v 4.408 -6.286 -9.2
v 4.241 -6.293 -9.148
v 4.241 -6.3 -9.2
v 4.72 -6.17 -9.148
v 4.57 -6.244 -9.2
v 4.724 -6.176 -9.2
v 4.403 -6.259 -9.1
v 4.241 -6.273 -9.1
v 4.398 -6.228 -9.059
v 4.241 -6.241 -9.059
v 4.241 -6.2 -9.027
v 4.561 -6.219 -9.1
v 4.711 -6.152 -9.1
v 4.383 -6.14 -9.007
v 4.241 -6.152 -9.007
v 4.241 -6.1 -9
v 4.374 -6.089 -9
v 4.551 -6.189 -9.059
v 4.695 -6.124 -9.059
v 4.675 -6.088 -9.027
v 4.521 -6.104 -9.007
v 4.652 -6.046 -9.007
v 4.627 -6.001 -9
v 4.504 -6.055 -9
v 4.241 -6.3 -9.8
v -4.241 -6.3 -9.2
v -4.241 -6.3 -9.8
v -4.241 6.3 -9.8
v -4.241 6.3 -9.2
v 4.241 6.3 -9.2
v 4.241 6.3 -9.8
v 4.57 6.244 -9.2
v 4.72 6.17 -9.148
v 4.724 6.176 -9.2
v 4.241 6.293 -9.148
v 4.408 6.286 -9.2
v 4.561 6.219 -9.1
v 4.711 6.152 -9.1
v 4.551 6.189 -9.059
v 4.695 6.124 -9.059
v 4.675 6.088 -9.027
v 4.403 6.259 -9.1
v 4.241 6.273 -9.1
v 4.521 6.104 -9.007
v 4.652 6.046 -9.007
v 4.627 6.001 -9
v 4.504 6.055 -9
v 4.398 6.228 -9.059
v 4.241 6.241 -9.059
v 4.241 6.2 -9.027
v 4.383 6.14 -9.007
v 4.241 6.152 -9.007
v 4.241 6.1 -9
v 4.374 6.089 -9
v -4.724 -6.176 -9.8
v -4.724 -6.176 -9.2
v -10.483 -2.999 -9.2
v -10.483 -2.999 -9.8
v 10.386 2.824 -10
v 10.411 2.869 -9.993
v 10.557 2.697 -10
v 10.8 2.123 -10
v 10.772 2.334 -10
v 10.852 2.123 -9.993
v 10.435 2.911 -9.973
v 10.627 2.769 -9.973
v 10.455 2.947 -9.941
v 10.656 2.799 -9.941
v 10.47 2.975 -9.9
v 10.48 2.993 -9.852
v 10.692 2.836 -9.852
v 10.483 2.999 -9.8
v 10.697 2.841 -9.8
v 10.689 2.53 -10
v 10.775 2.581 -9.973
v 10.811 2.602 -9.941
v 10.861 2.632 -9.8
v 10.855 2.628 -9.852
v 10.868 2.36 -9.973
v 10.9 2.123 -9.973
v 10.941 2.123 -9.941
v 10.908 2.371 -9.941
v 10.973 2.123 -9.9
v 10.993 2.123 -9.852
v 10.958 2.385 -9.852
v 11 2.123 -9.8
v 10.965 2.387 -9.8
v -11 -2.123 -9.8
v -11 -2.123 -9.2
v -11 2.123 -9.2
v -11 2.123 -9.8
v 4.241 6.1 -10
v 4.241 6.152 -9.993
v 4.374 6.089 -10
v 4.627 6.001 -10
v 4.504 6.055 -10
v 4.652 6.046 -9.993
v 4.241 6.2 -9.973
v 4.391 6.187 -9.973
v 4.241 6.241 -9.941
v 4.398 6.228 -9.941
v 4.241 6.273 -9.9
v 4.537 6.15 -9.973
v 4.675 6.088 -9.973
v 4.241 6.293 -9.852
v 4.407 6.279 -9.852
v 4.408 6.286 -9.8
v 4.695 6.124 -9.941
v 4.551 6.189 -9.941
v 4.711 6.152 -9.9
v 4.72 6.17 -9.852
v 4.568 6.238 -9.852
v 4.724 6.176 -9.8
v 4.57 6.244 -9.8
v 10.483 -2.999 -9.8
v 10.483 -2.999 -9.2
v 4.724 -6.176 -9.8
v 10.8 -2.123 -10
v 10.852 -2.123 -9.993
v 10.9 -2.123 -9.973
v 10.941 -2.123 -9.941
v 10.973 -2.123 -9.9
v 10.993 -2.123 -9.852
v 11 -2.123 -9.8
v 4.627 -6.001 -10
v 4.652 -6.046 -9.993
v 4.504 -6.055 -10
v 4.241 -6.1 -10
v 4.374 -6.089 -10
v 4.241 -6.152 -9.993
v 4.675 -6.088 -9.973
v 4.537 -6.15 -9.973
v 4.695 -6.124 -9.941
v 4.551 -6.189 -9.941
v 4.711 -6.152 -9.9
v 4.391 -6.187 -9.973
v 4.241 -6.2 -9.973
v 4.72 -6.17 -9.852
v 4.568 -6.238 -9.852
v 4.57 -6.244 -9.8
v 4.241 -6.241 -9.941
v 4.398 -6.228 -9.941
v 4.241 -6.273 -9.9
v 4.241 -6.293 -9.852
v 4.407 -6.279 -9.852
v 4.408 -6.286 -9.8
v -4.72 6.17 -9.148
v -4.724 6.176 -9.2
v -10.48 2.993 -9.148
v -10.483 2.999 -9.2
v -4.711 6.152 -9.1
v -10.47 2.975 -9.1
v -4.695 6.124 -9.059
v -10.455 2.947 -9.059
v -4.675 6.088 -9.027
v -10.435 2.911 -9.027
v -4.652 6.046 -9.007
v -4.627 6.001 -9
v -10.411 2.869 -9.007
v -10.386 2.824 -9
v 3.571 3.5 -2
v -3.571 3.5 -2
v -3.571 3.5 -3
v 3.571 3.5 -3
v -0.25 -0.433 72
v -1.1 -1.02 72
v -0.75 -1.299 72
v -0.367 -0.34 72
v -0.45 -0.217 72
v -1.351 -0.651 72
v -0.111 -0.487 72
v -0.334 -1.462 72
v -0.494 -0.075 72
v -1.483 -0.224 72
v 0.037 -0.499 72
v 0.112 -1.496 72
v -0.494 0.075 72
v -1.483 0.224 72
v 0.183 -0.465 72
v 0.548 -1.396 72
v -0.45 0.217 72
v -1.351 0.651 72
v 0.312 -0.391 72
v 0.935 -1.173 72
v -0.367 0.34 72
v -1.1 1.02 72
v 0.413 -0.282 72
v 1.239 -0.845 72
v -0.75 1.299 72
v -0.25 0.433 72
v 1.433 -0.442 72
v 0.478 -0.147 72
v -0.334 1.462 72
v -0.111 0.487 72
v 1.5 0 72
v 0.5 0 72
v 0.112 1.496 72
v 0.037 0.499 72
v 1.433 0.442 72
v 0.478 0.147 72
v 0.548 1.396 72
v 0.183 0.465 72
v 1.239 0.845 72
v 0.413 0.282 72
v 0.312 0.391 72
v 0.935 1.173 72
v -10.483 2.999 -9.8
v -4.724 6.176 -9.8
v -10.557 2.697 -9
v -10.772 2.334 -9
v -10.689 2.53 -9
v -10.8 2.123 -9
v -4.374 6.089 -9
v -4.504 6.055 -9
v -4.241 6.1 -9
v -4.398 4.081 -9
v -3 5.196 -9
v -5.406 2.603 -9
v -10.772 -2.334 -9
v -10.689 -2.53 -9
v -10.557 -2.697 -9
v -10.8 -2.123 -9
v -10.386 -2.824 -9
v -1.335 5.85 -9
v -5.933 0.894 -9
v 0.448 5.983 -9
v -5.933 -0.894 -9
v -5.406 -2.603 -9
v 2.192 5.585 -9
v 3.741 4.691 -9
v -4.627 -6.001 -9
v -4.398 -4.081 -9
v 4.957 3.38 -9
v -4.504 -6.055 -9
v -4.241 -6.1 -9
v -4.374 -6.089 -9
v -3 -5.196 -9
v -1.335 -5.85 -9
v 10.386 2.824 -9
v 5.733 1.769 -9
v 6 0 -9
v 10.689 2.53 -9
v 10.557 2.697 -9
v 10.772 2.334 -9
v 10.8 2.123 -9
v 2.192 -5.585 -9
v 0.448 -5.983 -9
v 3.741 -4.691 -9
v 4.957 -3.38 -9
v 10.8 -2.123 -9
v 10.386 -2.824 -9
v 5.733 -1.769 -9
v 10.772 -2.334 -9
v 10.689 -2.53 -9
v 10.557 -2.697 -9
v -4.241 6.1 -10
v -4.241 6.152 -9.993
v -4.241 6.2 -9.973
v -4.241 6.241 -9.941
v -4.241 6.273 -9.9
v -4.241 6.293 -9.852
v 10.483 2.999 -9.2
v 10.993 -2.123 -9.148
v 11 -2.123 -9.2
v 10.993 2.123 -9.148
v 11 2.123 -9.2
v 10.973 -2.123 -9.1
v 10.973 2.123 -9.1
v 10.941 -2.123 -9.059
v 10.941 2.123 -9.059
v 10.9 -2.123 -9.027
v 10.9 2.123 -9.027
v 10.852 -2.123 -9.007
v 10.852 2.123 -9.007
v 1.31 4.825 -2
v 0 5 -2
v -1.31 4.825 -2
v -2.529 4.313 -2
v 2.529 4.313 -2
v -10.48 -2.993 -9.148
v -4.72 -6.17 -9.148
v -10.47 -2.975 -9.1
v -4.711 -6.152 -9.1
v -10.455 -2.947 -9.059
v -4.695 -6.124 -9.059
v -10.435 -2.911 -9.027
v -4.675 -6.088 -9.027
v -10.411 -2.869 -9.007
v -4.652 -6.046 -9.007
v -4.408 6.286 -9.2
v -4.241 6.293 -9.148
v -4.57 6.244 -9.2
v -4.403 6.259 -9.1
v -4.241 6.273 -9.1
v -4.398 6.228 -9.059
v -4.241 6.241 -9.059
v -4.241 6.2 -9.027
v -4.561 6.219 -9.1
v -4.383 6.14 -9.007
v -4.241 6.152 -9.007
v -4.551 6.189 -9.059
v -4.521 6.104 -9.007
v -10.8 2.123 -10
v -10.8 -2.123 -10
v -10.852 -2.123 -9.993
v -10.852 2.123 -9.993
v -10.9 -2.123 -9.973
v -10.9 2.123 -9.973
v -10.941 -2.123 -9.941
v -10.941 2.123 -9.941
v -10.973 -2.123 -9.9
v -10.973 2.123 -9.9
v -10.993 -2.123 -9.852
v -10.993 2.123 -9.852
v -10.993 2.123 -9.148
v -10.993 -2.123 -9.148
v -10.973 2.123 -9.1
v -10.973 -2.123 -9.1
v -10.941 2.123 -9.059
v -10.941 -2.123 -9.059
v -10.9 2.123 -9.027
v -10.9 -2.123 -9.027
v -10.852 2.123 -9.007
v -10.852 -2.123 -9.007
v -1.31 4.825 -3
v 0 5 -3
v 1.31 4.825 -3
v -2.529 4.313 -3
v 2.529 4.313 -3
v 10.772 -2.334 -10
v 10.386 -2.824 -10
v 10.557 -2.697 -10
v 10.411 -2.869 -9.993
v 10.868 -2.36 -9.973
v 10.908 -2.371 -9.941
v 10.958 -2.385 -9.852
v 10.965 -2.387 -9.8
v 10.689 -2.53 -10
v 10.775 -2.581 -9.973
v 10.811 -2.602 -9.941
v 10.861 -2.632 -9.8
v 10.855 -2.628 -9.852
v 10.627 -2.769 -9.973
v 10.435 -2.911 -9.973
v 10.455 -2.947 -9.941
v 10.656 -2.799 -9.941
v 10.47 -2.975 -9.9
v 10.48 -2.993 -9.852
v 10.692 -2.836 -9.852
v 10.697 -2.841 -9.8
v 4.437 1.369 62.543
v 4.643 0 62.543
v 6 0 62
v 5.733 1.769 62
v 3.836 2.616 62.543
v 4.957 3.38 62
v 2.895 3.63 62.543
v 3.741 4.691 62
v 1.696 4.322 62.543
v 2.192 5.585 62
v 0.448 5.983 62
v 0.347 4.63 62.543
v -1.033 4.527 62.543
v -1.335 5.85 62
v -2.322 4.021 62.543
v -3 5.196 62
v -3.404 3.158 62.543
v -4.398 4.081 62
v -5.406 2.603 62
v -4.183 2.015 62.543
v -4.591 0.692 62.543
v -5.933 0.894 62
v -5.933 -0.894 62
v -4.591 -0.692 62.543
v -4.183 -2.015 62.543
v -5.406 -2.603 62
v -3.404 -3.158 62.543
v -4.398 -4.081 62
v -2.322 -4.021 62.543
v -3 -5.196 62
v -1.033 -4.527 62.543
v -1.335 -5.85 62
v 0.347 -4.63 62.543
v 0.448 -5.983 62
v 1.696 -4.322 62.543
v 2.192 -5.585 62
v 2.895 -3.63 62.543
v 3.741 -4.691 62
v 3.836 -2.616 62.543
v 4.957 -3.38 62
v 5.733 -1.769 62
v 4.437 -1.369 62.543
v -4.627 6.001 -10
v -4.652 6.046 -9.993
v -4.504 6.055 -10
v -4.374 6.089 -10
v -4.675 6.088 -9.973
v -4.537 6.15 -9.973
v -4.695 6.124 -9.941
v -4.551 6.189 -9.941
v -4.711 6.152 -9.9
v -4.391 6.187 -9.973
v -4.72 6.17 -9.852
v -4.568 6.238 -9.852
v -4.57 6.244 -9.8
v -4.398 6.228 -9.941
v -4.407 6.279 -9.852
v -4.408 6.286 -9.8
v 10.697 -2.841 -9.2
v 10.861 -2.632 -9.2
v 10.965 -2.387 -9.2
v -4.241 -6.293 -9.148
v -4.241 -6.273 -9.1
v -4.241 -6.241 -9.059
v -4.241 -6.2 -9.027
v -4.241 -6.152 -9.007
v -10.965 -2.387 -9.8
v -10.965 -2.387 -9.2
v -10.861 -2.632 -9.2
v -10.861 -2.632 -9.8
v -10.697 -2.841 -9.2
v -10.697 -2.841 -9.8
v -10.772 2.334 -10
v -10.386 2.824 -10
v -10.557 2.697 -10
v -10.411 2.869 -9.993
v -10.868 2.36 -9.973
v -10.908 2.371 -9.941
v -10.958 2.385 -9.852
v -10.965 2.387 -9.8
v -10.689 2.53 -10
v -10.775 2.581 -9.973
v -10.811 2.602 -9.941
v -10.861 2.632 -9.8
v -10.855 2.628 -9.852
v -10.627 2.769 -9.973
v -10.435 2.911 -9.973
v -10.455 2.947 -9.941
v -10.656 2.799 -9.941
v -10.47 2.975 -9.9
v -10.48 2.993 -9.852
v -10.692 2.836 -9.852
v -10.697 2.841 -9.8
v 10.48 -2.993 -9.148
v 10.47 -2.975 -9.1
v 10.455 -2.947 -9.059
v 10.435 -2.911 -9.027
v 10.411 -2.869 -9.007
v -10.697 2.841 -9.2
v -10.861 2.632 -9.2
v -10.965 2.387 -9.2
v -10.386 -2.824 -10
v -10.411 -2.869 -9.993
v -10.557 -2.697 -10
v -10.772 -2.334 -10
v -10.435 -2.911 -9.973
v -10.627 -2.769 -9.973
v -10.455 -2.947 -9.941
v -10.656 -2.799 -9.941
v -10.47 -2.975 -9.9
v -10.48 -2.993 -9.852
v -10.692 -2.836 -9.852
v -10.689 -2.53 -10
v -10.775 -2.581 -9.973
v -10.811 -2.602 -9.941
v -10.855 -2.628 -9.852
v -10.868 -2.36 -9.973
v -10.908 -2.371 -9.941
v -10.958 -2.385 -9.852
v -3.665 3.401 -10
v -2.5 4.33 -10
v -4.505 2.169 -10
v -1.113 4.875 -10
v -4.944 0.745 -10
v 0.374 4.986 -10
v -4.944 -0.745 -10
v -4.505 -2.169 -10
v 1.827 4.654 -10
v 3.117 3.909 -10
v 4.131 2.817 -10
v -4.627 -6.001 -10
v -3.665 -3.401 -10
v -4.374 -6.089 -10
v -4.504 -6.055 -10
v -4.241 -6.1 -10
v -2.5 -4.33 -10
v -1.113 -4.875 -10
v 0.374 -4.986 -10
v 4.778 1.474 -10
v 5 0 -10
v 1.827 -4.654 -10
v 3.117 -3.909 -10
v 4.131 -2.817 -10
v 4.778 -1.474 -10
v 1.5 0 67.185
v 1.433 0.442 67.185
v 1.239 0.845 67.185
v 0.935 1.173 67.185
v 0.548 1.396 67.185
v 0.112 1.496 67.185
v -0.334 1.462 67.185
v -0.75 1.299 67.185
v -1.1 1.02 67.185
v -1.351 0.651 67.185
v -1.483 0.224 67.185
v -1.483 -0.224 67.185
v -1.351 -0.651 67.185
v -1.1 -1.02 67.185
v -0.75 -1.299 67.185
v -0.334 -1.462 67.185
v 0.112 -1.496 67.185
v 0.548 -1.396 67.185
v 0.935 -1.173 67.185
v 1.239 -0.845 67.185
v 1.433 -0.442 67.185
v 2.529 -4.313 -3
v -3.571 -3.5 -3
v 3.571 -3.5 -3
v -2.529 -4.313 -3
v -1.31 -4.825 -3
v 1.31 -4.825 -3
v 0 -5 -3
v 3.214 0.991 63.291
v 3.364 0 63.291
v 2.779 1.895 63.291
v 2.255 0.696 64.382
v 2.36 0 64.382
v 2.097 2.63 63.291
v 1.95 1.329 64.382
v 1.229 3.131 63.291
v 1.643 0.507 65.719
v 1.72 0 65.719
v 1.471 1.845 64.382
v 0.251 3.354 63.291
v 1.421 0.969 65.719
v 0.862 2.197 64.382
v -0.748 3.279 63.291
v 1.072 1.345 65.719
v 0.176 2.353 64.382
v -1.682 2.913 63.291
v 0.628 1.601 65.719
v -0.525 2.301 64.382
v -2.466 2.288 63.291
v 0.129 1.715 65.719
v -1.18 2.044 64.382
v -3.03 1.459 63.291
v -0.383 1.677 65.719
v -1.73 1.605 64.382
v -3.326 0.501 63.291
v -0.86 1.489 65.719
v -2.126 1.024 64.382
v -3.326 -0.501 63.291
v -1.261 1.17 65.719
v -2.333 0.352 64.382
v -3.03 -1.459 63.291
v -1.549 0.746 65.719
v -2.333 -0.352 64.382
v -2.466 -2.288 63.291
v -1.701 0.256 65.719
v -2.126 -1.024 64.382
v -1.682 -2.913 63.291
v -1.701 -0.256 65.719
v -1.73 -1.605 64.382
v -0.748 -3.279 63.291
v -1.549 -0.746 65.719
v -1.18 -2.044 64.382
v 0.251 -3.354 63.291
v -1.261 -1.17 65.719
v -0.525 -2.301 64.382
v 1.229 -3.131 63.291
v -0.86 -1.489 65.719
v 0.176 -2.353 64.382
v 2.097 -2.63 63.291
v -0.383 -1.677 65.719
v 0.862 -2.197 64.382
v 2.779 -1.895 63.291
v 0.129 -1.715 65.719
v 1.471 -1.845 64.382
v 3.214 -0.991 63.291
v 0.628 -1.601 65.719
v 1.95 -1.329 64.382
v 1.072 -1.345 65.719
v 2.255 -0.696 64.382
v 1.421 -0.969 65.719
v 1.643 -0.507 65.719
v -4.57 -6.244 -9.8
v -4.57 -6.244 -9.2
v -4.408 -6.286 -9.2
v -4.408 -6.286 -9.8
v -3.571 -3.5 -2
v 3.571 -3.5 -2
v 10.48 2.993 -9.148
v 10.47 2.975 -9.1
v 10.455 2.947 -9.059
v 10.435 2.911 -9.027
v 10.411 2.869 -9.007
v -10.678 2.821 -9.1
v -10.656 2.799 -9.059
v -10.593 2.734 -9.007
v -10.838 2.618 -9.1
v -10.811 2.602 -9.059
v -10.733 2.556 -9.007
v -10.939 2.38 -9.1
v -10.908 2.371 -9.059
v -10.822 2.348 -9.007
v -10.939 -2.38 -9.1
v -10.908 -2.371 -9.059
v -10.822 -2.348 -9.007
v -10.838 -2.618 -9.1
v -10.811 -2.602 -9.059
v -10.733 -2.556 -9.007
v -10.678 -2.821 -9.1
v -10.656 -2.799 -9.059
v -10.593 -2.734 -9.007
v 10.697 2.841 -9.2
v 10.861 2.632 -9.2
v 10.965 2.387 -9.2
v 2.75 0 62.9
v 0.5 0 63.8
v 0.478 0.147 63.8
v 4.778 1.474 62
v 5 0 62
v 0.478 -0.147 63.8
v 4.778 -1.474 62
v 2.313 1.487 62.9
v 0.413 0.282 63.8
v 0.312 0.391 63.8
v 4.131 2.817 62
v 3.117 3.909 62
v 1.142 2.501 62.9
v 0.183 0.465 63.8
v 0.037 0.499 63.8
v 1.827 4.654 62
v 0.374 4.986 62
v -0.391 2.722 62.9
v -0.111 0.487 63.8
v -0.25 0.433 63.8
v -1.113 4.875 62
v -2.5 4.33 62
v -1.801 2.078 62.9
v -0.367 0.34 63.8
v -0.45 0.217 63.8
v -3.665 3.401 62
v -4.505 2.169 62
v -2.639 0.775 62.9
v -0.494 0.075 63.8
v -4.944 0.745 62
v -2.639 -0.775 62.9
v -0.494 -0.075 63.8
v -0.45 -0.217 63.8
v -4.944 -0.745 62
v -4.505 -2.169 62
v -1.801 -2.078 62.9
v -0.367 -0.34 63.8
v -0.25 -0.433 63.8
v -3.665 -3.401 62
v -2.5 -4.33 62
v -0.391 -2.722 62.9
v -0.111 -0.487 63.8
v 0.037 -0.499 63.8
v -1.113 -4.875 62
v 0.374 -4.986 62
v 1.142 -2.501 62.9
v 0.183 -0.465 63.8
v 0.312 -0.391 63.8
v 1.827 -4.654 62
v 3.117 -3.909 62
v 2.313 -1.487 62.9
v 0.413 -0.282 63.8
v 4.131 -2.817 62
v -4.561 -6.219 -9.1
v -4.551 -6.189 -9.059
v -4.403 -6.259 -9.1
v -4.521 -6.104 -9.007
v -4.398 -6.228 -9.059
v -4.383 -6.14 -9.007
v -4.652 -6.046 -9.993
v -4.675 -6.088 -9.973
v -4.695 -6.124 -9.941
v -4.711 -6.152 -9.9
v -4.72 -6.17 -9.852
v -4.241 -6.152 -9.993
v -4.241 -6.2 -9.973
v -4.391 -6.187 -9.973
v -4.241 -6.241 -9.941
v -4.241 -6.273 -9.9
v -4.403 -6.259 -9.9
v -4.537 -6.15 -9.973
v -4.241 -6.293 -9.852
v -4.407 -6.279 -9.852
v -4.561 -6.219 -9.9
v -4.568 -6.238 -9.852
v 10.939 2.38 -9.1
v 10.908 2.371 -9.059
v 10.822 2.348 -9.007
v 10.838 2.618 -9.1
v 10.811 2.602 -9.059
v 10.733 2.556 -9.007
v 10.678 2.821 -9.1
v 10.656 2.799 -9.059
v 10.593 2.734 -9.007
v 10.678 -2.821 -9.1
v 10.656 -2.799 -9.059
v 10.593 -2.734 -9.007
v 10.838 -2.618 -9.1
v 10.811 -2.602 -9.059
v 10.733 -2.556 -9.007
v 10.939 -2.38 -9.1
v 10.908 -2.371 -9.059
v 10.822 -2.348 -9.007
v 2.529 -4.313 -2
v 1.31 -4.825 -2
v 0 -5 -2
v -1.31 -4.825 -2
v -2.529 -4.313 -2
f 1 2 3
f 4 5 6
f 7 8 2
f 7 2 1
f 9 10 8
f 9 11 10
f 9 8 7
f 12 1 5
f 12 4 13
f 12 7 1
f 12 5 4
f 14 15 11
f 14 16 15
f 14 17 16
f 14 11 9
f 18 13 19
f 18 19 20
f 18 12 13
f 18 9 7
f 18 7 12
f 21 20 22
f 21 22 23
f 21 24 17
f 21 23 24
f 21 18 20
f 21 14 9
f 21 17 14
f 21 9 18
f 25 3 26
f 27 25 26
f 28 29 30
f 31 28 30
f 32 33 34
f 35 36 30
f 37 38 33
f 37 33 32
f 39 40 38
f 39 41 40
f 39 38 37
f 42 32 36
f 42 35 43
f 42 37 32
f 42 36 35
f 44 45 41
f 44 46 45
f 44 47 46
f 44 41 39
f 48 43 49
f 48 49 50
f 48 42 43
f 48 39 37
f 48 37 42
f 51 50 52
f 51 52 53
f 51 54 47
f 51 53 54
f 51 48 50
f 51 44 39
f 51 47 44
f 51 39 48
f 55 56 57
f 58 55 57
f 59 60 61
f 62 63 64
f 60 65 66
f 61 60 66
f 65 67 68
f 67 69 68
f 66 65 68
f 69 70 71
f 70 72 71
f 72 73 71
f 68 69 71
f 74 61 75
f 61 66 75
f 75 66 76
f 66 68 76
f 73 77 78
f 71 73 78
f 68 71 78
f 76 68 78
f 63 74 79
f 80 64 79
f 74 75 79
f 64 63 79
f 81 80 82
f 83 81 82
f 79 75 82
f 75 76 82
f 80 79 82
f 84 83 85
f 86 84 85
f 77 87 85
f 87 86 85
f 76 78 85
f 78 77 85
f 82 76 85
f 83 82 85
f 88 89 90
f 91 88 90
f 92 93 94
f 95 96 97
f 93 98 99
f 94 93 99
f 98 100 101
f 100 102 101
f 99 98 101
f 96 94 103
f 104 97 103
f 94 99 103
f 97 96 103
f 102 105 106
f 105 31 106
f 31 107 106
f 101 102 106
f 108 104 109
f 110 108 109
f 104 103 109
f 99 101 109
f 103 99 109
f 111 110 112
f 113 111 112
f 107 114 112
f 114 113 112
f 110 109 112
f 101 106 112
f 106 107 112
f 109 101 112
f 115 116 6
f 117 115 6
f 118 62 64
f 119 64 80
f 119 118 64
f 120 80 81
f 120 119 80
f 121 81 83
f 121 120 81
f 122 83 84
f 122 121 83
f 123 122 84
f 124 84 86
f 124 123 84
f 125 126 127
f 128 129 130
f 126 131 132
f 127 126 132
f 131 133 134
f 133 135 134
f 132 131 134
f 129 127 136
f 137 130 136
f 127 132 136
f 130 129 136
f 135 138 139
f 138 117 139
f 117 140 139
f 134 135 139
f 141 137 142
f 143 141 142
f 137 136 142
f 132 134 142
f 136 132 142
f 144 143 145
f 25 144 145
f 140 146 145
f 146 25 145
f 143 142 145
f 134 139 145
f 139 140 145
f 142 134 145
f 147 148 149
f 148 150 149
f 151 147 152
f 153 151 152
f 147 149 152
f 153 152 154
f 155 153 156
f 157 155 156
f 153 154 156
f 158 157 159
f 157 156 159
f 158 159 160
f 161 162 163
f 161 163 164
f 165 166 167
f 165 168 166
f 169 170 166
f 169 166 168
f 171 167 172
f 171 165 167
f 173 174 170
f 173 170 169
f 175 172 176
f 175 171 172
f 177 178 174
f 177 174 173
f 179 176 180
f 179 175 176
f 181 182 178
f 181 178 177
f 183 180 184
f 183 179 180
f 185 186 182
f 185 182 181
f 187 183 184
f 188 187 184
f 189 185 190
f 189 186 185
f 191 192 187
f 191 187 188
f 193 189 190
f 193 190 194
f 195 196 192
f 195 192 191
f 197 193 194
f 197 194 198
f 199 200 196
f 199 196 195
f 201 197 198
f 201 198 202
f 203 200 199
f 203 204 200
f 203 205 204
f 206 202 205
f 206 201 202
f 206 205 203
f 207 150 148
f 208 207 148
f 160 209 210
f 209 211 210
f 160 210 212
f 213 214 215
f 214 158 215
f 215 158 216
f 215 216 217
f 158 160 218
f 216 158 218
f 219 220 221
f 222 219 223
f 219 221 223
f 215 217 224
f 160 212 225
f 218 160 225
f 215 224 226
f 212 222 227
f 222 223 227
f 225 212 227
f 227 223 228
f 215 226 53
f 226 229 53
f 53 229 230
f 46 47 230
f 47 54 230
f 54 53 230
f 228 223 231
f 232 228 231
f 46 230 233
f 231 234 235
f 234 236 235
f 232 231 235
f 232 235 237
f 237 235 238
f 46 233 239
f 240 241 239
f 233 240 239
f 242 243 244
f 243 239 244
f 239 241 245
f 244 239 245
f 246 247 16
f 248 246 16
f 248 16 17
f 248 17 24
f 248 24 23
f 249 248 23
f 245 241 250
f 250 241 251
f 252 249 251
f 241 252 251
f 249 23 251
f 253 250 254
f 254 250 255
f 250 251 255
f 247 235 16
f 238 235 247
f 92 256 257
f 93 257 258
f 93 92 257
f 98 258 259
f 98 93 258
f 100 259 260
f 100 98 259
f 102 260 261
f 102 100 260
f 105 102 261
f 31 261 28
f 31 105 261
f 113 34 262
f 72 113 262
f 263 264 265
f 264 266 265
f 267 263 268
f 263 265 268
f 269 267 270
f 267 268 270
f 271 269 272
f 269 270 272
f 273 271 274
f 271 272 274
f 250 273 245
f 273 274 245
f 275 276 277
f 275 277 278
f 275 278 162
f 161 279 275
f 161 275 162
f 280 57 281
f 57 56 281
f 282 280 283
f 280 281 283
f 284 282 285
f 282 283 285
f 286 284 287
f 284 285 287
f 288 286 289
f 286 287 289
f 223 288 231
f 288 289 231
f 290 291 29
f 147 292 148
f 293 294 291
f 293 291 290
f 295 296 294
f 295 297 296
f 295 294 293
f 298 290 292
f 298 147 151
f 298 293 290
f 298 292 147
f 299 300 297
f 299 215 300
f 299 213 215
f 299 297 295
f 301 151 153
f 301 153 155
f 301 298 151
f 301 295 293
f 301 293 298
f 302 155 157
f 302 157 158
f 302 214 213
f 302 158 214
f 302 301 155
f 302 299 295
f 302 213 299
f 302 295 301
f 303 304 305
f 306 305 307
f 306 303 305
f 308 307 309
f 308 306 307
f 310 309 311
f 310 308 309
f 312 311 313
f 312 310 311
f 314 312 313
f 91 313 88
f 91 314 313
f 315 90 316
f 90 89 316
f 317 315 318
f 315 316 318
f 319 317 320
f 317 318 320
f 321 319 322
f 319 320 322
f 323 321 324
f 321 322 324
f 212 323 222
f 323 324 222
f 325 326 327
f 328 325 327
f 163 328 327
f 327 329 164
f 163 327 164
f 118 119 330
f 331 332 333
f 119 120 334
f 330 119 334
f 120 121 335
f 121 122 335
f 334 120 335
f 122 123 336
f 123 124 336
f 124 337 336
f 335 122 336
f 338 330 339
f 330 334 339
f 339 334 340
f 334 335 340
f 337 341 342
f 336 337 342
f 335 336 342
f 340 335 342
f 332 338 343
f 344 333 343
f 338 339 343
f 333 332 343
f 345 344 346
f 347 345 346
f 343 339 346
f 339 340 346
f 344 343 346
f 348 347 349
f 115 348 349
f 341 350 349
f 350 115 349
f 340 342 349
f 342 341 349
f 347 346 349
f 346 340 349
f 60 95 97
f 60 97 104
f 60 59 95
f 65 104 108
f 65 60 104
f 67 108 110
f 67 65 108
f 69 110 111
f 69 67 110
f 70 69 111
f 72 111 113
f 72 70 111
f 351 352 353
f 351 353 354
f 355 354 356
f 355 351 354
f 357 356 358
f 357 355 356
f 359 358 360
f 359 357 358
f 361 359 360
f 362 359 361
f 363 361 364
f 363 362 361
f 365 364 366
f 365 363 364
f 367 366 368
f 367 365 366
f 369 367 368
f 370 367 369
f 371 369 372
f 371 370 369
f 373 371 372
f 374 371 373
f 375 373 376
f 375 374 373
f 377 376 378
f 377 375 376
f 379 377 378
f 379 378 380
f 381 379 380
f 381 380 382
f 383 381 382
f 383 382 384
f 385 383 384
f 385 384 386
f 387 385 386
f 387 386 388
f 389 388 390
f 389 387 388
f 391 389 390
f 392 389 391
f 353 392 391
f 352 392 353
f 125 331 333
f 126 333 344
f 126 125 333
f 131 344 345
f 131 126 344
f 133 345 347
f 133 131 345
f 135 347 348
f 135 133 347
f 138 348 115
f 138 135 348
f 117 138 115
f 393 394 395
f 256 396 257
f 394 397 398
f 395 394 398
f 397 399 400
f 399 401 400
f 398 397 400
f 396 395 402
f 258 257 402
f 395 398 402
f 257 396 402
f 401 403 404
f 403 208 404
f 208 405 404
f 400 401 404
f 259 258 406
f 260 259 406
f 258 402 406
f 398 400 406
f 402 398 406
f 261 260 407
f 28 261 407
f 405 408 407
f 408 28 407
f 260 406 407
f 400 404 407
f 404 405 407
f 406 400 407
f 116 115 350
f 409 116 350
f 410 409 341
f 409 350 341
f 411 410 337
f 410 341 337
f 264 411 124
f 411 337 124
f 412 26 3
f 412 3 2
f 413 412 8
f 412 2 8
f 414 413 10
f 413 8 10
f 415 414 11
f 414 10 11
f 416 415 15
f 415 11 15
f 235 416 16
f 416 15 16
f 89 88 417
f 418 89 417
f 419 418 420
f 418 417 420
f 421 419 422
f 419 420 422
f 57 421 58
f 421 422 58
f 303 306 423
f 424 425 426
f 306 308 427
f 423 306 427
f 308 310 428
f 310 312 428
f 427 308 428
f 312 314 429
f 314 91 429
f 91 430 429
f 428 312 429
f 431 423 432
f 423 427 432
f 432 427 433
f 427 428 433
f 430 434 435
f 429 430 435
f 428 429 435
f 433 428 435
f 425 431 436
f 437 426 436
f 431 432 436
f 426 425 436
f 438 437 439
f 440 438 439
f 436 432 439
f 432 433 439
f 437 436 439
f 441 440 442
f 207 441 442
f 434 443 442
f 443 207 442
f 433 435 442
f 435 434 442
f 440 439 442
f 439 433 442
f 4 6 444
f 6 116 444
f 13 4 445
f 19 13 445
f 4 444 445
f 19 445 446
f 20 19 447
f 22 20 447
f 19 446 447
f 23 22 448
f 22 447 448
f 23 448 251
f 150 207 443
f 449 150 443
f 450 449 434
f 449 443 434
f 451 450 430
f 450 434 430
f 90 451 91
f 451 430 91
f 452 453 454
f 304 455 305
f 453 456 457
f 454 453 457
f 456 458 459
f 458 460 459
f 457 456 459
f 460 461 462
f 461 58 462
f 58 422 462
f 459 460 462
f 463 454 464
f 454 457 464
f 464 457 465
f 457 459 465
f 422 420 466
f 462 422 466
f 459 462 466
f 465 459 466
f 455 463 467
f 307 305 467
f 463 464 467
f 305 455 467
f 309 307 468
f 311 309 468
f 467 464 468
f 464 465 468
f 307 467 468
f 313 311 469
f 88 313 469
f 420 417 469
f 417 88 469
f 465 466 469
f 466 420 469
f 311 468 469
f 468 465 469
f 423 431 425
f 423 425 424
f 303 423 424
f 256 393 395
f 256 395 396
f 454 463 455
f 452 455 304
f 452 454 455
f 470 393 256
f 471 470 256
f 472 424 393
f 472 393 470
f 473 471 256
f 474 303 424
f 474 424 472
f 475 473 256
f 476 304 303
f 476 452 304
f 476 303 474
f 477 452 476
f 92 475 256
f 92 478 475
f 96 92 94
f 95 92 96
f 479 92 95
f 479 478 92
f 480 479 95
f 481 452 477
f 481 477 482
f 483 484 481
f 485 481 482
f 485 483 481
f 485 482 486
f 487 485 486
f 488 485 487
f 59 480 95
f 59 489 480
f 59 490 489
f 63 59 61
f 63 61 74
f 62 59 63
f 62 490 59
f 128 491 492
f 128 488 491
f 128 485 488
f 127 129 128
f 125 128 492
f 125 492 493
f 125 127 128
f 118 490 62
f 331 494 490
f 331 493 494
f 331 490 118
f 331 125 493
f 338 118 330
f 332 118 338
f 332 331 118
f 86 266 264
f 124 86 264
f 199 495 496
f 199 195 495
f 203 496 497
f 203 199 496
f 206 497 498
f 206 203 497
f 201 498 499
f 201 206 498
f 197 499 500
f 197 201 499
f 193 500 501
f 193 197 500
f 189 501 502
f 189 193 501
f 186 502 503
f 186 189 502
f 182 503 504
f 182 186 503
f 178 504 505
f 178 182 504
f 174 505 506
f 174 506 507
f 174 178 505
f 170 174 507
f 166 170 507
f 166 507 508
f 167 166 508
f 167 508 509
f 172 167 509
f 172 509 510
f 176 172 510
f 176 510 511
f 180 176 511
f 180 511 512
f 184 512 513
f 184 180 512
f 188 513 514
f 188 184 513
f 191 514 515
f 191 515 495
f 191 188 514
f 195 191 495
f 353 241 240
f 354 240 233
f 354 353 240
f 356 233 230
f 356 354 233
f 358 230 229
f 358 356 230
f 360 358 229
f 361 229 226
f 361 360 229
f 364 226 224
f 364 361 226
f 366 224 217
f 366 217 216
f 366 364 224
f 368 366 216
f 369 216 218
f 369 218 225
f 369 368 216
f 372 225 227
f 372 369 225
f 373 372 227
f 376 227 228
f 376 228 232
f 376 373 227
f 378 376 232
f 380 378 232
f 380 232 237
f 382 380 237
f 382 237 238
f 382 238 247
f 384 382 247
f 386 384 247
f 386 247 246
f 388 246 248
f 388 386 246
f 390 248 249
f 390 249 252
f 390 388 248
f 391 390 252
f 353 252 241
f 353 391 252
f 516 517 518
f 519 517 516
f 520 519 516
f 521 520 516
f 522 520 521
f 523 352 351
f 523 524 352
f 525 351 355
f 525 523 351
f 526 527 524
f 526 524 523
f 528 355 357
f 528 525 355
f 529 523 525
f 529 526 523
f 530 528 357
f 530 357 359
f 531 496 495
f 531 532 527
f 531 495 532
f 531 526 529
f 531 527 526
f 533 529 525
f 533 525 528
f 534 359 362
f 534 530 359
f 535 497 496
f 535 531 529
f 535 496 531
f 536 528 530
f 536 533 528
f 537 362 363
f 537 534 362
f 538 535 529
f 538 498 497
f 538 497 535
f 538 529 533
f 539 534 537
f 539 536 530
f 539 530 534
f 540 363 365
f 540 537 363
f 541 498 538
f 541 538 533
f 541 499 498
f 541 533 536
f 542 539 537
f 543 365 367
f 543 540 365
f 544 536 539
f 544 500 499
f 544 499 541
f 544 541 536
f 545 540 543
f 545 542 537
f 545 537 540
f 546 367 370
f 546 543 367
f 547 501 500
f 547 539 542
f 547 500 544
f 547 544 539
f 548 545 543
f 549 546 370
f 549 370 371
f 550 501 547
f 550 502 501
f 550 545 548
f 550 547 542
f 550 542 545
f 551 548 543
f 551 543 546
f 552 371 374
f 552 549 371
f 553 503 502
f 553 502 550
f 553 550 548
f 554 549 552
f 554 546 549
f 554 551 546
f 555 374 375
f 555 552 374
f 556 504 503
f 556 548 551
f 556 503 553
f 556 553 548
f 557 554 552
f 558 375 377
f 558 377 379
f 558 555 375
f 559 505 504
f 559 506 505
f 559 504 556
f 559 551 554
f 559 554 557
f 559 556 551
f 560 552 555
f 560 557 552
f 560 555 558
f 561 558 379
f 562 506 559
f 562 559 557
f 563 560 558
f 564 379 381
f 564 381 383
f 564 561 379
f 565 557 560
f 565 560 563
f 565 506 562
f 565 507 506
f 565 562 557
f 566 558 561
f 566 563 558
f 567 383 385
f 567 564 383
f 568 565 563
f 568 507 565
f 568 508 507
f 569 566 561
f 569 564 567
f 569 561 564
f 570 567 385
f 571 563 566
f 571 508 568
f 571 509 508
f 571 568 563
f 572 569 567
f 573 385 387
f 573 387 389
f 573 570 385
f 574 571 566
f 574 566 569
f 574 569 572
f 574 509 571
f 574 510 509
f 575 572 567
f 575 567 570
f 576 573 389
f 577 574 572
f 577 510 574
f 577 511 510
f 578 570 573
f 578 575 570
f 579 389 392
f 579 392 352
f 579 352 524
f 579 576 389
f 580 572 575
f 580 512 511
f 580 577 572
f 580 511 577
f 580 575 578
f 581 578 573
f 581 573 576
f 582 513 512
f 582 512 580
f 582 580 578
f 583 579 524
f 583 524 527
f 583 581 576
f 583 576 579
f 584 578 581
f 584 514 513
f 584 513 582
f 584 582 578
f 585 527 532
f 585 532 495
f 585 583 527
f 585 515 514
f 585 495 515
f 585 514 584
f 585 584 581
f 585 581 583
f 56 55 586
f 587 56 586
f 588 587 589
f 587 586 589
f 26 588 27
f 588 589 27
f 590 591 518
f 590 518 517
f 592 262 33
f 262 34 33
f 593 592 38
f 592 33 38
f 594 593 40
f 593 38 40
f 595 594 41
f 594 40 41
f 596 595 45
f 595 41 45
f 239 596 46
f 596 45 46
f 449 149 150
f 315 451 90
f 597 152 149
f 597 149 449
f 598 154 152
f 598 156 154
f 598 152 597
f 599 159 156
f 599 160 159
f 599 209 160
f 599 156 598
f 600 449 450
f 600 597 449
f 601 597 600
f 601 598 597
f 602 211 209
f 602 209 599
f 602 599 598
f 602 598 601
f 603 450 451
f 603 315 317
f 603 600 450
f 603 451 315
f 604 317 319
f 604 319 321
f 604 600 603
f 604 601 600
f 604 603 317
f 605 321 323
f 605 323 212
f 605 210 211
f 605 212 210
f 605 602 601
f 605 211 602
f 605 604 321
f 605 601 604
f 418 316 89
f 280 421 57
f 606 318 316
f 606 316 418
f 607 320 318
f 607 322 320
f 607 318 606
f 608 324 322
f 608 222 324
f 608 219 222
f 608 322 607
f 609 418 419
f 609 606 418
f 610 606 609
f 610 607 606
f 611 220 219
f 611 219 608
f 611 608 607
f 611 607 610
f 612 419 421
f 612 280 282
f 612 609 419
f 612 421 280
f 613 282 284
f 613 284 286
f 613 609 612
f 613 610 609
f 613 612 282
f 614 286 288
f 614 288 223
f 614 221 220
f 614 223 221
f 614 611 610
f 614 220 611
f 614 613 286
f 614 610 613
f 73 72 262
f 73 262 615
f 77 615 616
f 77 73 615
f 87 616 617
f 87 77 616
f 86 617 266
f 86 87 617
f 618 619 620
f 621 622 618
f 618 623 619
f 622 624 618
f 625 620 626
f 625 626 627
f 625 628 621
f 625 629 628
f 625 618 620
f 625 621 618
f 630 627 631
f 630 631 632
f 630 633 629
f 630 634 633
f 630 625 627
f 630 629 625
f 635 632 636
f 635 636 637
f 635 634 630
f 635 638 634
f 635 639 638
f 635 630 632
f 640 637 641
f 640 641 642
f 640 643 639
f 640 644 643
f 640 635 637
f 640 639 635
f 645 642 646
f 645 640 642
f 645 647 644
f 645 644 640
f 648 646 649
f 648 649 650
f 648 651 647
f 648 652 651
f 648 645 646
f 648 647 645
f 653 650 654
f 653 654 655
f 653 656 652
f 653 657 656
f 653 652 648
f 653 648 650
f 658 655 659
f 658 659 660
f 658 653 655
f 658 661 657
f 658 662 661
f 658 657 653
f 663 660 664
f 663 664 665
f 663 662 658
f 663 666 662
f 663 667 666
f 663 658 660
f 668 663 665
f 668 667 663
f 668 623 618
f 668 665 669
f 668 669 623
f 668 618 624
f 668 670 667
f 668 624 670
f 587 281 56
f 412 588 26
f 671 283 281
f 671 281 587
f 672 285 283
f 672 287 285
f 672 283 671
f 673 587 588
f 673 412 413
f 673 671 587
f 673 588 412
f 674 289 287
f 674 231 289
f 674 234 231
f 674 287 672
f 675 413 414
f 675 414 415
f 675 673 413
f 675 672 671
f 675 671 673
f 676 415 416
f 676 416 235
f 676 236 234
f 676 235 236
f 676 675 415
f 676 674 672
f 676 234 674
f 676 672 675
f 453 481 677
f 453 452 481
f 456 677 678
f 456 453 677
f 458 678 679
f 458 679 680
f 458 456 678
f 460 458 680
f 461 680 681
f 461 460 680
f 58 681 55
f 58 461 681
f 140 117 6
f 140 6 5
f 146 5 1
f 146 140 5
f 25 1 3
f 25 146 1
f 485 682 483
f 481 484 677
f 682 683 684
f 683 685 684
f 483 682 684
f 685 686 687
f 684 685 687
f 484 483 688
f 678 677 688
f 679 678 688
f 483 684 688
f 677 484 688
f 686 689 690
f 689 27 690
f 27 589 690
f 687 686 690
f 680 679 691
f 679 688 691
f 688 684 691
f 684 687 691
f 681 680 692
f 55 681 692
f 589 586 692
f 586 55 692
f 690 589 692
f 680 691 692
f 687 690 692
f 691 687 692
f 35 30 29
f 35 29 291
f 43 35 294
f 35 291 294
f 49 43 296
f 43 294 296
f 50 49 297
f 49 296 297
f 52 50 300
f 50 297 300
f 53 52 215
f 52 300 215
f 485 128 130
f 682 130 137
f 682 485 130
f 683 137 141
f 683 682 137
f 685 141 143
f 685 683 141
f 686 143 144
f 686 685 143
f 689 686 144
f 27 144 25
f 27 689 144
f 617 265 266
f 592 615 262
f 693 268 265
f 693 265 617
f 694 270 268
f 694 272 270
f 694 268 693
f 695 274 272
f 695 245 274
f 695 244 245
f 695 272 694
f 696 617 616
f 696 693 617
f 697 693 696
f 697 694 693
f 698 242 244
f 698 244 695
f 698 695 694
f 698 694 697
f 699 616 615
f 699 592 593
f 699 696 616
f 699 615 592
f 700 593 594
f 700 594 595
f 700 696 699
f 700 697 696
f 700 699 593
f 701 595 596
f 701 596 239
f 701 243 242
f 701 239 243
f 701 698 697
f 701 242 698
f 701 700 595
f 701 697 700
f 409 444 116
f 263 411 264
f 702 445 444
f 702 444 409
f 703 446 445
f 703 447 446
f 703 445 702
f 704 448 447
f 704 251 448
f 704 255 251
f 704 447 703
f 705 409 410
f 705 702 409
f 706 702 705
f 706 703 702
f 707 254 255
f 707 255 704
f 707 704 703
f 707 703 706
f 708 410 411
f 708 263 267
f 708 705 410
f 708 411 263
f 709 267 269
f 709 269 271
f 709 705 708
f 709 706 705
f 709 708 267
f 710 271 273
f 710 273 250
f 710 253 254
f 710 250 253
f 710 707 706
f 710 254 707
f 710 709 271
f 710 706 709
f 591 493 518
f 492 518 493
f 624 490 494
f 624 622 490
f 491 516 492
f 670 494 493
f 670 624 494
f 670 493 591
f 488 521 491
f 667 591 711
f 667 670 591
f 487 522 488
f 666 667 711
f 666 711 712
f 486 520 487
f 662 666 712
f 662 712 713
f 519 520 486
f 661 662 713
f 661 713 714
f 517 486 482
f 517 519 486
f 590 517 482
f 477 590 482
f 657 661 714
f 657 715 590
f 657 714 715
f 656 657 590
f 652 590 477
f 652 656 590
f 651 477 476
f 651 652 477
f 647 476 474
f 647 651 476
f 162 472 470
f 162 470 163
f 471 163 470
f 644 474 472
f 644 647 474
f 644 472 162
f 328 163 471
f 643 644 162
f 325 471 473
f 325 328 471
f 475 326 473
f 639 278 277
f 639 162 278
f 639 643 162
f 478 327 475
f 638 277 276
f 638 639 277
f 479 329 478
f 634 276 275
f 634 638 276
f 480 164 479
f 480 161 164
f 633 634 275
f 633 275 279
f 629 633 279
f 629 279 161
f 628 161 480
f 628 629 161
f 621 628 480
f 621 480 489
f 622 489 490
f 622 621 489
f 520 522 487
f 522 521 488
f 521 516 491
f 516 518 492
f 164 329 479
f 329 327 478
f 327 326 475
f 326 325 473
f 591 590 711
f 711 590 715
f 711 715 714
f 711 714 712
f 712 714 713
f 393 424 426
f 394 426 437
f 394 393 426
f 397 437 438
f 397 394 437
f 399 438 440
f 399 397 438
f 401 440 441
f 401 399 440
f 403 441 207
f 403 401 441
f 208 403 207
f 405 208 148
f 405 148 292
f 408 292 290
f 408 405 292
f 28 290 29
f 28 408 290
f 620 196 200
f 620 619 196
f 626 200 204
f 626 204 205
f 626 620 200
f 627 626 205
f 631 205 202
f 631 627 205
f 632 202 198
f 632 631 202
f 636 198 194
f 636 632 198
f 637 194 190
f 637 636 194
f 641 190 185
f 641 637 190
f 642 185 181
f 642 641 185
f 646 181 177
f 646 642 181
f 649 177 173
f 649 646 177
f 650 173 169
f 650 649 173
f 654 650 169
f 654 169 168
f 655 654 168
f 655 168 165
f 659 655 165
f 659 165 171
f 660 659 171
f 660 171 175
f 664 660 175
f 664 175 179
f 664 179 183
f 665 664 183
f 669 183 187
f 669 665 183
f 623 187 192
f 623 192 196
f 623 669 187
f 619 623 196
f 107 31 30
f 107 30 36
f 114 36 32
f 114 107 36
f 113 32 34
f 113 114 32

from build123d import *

# Parameters (mm, degrees)
F0_R          = 6
F0_R_2        = 5
F1_DEPTH      = 62
F1_DEPTH_BACK = 9
F6_DEPTH      = 1
F8_R          = 5
F9_DEPTH      = 1
F10_R         = 1
F11_R         = 0.2
F12_R         = 0.2


# Not quite as in the source:
# - a feature names something its author has since deleted; it is built from what else it names


with BuildPart() as f1:
    # F0 (on Top) → F1 (new body, two sides)
    with BuildSketch(Plane.XY) as f1_sk:
        Circle(F0_R)
        Circle(F0_R_2, mode=Mode.SUBTRACT)
    extrude(amount=F1_DEPTH)
    extrude(f1_sk.sketch, amount=-F1_DEPTH_BACK)

    # F2 (on Front) → F3 (revolve)
    with BuildSketch(Plane.XZ):
        with BuildLine():
            Line((6, 62), (4.6430466171, 62.5427813535))
            ThreePointArc((4.6430466171, 62.5427813535), (2.3596638473, 64.3820207615), (1.5, 67.1851648075))
            Line((1.5, 67.1851648075), (1.5, 72))
            Line((1.5, 72), (0.5, 72))
            Line((0.5, 72), (0.5, 63.8000000012))
            Line((0.5, 63.8000000012), (5, 62))
            Line((5, 62), (6, 62))
        make_face()
    revolve(axis=Axis((0, 0, 62.4439572394), (0, 0, 1)))

    # F5 (on offset) → F6 (join)
    with BuildSketch(Plane.XY.offset(-2)):
        with BuildLine():
            ThreePointArc((-3.5707142143, -3.5), (0, -5), (3.5707142143, -3.5))
            Line((3.5707142143, -3.5), (-3.5707142143, -3.5))
        make_face()
        with BuildLine():
            Line((-3.5707142143, 3.5), (3.5707142143, 3.5))
            ThreePointArc((3.5707142143, 3.5), (0, 5), (-3.5707142143, 3.5))
        make_face()
    extrude(amount=-F6_DEPTH)

    # F8 (on offset) → F9 (join)
    with BuildSketch(Plane(origin=(0, 0, -9), x_dir=(1, 0, 0), z_dir=(0, 0, -1))):
        Polygon((11, 2.7135847191), (4.4980677776, 6.3), (-4.4980677776, 6.3), (-11, 2.7135847191), (-11, -2.7135847191), (-4.4980677776, -6.3), (4.4980677776, -6.3), (11, -2.7135847191), align=None)
        Circle(F8_R, mode=Mode.SUBTRACT)
    extrude(amount=F9_DEPTH)

    # F10
    f10_edges = [f1.edges().sort_by_distance(p)[0] for p in [
        (11, -2.713585, -9.5),
        (4.498068, -6.3, -9.5),
        (11, 2.713585, -9.5),
        (-4.498068, -6.3, -9.5),
        (4.498068, 6.3, -9.5),
        (-11, -2.713585, -9.5),
        (-4.498068, 6.3, -9.5),
        (-11, 2.713585, -9.5),
    ]]
    fillet(f10_edges, radius=F10_R)

    # F11
    f11_edges = [f1.edges().sort_by_distance(p)[0] for p in [
        (-7.603269, -4.587195, -10),
        (-4.489932, -6.268408, -10),
        (0, -6.3, -10),
        (-11, 0, -10),
        (-10.861101, -2.631572, -10),
        (-10.861101, 2.631572, -10),
        (-7.603269, 4.587195, -10),
        (-4.489932, 6.268408, -10),
        (0, 6.3, -10),
        (4.489932, 6.268408, -10),
        (7.603269, 4.587195, -10),
        (7.603269, -4.587195, -10),
        (4.489932, -6.268408, -10),
        (10.861101, -2.631572, -10),
        (11, 0, -10),
        (10.861101, 2.631572, -10),
    ]]
    fillet(f11_edges, radius=F11_R)

    # F12
    f12_edges = [f1.edges().sort_by_distance(p)[0] for p in [
        (10.861101, -2.631572, -9),
        (11, 0, -9),
        (10.861101, 2.631572, -9),
        (7.603269, 4.587195, -9),
        (4.489932, 6.268408, -9),
        (0, 6.3, -9),
        (-4.489932, 6.268408, -9),
        (-10.861101, 2.631572, -9),
        (-7.603269, 4.587195, -9),
        (7.603269, -4.587195, -9),
        (0, -6.3, -9),
        (-11, 0, -9),
        (-10.861101, -2.631572, -9),
        (-4.489932, -6.268408, -9),
        (4.489932, -6.268408, -9),
        (-7.603269, -4.587195, -9),
    ]]
    fillet(f12_edges, radius=F12_R)


solid = f1.part
